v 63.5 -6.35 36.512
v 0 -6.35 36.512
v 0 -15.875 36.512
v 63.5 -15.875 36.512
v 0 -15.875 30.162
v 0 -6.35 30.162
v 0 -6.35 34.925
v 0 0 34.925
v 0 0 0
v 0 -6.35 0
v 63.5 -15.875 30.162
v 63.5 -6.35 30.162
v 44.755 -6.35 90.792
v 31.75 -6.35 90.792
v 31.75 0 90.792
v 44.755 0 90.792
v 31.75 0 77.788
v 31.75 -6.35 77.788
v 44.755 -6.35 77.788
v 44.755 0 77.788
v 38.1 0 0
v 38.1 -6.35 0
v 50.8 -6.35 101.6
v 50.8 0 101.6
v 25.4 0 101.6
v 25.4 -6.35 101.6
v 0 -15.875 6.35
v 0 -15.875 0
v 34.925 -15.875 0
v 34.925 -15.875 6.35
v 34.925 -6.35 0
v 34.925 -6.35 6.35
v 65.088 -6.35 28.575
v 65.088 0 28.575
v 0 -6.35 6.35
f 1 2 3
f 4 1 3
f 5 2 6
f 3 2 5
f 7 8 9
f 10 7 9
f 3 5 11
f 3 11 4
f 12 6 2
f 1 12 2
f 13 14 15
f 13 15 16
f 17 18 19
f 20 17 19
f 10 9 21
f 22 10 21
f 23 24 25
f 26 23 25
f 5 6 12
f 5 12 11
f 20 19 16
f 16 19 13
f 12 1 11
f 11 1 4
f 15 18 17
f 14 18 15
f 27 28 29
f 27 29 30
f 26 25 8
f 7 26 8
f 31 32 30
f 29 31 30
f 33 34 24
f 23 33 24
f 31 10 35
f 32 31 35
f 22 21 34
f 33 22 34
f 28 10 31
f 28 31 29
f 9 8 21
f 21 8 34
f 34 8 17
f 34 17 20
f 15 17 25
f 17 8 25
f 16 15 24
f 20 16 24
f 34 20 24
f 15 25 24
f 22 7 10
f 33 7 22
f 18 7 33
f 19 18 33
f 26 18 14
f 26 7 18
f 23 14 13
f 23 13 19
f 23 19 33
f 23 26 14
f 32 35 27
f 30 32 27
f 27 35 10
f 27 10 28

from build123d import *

# Parameters (mm, degrees)
F1_DEPTH = 6.35
F2_W     = 13.0048
F2_H     = 13.0048
F3_DEPTH = 25.4
F4_W     = 9.525
F4_H     = 6.35
F5_DEPTH = 34.925
F6_W     = 9.525
F6_H     = 6.35
F7_DEPTH = 63.5


with BuildPart() as f1:
    # F0 (on Front) → F1 (new body)
    with BuildSketch(Plane.XZ):
        Polygon((0, 34.925), (0, 0), (38.1, 0), (65.0875, 28.575), (50.8, 101.6), (25.4, 101.6), align=None)
    extrude(amount=F1_DEPTH)

    # F2 (on face) → F3 (cut)
    with BuildSketch(Plane.XZ.offset(6.35)):
        with Locations((38.2524, 84.2899)):
            Rectangle(F2_W, F2_H)
    extrude(amount=-F3_DEPTH, mode=Mode.SUBTRACT)


with BuildPart() as f5:
    # F4 (on face) → F5 (new body)
    with BuildSketch(Plane(origin=(0, 0, 0), x_dir=(0, -1, 0), z_dir=(-1, 0, 0))):
        with Locations((11.1125, 3.175)):
            Rectangle(F4_W, F4_H)
    extrude(amount=-F5_DEPTH)


with BuildPart() as f7:
    # F6 (on face) → F7 (new body)
    with BuildSketch(Plane(origin=(0, 0, 0), x_dir=(0, -1, 0), z_dir=(-1, 0, 0))):
        with Locations((11.1125, 33.3375)):
            Rectangle(F6_W, F6_H)
    extrude(amount=-F7_DEPTH)


solid = Compound([f1.part, f5.part, f7.part])
